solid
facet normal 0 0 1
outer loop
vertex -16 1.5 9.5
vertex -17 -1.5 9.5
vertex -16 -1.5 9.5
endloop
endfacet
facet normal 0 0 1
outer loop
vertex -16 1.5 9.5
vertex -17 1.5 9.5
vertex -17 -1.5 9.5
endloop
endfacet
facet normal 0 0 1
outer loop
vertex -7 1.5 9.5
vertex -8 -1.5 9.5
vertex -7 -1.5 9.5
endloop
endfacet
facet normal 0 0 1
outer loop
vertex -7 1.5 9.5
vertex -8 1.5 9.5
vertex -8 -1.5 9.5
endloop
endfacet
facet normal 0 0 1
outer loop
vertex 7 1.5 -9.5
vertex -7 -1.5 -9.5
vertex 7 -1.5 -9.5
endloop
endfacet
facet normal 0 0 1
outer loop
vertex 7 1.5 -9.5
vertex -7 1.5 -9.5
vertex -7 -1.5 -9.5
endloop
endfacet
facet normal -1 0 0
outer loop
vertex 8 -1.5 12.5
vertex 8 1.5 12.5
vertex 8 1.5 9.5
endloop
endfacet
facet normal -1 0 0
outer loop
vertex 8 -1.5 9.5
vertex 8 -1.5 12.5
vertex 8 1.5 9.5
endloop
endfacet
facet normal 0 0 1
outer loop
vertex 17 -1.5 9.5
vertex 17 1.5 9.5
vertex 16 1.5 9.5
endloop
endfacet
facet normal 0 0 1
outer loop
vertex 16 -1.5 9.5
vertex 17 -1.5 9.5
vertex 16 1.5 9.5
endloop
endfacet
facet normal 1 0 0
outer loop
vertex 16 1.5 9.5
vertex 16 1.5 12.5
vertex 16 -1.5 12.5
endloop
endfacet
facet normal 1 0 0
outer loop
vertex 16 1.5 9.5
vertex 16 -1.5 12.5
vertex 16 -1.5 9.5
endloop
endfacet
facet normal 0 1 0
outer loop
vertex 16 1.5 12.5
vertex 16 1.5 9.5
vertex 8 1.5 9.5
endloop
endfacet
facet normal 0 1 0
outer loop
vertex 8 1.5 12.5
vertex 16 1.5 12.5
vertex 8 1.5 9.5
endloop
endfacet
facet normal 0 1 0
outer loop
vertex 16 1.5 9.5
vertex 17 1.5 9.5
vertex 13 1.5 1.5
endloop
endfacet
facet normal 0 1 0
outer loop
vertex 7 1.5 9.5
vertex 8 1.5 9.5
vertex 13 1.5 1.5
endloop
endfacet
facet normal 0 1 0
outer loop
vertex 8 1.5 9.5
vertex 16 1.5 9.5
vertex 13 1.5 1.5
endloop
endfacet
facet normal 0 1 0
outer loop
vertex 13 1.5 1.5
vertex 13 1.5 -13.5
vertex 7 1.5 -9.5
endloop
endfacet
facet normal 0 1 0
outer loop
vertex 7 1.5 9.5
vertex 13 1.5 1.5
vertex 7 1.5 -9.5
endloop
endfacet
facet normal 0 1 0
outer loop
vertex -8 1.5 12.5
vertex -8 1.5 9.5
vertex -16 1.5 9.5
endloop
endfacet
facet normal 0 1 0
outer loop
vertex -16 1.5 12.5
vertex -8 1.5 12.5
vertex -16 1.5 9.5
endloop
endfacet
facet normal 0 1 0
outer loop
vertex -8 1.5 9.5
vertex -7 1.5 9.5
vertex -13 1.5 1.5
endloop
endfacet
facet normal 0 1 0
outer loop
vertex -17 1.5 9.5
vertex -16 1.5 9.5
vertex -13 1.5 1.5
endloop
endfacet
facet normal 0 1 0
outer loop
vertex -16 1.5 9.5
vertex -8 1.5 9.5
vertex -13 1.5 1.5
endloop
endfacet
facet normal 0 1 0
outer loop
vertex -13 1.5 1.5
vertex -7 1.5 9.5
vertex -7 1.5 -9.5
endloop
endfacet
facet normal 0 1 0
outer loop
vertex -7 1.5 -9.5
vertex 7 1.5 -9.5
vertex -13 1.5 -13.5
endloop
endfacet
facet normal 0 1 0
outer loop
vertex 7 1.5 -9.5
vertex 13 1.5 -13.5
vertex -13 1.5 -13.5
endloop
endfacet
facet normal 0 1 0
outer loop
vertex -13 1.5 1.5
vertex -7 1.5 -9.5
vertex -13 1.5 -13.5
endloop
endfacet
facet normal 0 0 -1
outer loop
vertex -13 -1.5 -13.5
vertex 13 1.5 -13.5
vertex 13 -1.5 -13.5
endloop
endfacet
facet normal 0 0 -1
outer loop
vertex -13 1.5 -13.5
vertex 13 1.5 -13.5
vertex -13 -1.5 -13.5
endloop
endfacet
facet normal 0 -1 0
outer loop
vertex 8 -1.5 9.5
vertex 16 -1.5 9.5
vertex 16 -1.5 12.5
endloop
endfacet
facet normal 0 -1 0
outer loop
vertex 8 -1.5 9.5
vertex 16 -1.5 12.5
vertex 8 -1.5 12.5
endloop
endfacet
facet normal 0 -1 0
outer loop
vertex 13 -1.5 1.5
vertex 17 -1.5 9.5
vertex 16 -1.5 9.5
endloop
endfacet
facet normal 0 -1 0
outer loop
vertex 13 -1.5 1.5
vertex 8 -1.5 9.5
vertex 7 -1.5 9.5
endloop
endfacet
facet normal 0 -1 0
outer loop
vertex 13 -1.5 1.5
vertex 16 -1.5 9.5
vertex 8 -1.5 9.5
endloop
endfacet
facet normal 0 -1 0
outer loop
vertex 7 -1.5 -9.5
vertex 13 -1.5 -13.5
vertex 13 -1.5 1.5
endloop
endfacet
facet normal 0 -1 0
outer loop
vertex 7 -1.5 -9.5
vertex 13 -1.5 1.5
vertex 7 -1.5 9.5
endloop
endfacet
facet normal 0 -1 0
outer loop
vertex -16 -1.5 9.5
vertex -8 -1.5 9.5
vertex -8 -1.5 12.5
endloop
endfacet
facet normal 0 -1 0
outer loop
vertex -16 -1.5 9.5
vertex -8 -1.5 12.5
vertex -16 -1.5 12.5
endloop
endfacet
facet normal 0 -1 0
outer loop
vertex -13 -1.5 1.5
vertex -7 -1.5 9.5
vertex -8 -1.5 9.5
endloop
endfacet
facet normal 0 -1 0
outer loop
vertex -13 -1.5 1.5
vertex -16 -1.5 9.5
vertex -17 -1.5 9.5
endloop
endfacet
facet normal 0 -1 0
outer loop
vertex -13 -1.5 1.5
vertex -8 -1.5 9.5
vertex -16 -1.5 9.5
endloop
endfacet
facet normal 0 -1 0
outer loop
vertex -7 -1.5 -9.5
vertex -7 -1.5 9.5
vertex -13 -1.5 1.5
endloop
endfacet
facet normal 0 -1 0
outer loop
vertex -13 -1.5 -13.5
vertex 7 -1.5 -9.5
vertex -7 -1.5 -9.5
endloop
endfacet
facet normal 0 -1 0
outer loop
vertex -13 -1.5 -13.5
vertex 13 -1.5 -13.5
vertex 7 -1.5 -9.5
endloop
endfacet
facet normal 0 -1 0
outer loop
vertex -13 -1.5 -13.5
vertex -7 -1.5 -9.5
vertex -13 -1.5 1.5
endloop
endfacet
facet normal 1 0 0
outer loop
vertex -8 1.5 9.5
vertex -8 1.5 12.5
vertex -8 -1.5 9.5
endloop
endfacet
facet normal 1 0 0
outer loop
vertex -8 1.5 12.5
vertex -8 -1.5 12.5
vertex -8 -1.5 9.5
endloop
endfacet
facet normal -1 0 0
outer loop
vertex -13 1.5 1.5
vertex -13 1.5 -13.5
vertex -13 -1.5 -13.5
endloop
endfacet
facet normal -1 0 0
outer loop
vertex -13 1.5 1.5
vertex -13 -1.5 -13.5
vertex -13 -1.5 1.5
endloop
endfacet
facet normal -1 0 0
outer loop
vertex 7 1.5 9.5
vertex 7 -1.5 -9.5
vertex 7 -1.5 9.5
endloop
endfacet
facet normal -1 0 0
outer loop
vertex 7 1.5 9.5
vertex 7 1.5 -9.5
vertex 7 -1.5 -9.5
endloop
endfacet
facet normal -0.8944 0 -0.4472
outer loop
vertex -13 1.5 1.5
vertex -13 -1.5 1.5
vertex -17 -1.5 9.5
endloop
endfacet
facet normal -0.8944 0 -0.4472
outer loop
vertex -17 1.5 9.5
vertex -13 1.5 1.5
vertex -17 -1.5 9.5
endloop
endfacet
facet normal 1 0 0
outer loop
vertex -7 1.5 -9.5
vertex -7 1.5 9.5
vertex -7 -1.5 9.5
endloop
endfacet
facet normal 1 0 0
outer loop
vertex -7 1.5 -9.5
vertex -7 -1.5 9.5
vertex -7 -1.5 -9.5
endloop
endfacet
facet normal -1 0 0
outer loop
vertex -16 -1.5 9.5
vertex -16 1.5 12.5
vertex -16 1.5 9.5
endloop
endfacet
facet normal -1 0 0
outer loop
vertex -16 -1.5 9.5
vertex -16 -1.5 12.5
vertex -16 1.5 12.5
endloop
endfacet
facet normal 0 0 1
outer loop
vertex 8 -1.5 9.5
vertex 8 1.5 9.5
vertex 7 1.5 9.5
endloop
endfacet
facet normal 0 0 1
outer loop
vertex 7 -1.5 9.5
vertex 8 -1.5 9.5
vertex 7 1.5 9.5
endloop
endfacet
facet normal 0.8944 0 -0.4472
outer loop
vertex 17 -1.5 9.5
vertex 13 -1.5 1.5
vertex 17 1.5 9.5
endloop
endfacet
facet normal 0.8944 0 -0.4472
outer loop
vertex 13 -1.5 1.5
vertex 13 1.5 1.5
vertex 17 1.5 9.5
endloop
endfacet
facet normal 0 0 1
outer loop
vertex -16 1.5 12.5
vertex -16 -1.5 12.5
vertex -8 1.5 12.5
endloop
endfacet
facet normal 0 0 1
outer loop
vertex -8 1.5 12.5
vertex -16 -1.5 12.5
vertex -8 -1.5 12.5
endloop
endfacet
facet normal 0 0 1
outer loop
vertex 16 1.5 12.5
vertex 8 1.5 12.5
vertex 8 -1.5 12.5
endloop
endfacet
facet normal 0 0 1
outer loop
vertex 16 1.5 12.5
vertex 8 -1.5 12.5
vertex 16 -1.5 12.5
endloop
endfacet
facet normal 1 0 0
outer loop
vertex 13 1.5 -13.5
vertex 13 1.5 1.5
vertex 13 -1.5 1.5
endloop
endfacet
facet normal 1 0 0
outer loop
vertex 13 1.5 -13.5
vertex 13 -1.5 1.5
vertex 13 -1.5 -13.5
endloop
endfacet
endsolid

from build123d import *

# Parameters (mm, degrees)
BOSS_EXTRUDE1_DEPTH = 1.5
BOSS_EXTRUDE2_DEPTH = 1.5
SKETCH3_W           = 8
SKETCH3_H           = 3
BOSS_EXTRUDE3_DEPTH = 1.5


with BuildPart() as part:
    # Sketch1 → Boss-Extrude1 (new body, symmetric)
    with BuildSketch(Plane(origin=(0, 0, 0), x_dir=(1, 0, 0), z_dir=(0, 1, 0))):
        Polygon((7, -9.5), (13, -9.5), (13, 13.5), (-13, 13.5), (-13, -9.5), (-7, -9.5), (-7, 9.5), (7, 9.5), align=None)
    extrude(amount=BOSS_EXTRUDE1_DEPTH, both=True)

    # Sketch2 → Boss-Extrude2 (add, symmetric)
    with BuildSketch(Plane(origin=(0, 0, 0), x_dir=(1, 0, 0), z_dir=(0, 1, 0))):
        Polygon((-13, -1.5), (-17, -9.5), (-13, -9.5), align=None)
        Polygon((13, -9.5), (13, -1.5), (17, -9.5), align=None)
    extrude(amount=BOSS_EXTRUDE2_DEPTH, both=True)

    # Sketch3 → Boss-Extrude3 (add, symmetric)
    with BuildSketch(Plane(origin=(0, 0, 0), x_dir=(1, 0, 0), z_dir=(0, 1, 0))):
        with Locations((-12, -11)):
            Rectangle(SKETCH3_W, SKETCH3_H)
        with Locations((12, -11)):
            Rectangle(SKETCH3_W, SKETCH3_H)
    extrude(amount=BOSS_EXTRUDE3_DEPTH, both=True)


solid = part.part
